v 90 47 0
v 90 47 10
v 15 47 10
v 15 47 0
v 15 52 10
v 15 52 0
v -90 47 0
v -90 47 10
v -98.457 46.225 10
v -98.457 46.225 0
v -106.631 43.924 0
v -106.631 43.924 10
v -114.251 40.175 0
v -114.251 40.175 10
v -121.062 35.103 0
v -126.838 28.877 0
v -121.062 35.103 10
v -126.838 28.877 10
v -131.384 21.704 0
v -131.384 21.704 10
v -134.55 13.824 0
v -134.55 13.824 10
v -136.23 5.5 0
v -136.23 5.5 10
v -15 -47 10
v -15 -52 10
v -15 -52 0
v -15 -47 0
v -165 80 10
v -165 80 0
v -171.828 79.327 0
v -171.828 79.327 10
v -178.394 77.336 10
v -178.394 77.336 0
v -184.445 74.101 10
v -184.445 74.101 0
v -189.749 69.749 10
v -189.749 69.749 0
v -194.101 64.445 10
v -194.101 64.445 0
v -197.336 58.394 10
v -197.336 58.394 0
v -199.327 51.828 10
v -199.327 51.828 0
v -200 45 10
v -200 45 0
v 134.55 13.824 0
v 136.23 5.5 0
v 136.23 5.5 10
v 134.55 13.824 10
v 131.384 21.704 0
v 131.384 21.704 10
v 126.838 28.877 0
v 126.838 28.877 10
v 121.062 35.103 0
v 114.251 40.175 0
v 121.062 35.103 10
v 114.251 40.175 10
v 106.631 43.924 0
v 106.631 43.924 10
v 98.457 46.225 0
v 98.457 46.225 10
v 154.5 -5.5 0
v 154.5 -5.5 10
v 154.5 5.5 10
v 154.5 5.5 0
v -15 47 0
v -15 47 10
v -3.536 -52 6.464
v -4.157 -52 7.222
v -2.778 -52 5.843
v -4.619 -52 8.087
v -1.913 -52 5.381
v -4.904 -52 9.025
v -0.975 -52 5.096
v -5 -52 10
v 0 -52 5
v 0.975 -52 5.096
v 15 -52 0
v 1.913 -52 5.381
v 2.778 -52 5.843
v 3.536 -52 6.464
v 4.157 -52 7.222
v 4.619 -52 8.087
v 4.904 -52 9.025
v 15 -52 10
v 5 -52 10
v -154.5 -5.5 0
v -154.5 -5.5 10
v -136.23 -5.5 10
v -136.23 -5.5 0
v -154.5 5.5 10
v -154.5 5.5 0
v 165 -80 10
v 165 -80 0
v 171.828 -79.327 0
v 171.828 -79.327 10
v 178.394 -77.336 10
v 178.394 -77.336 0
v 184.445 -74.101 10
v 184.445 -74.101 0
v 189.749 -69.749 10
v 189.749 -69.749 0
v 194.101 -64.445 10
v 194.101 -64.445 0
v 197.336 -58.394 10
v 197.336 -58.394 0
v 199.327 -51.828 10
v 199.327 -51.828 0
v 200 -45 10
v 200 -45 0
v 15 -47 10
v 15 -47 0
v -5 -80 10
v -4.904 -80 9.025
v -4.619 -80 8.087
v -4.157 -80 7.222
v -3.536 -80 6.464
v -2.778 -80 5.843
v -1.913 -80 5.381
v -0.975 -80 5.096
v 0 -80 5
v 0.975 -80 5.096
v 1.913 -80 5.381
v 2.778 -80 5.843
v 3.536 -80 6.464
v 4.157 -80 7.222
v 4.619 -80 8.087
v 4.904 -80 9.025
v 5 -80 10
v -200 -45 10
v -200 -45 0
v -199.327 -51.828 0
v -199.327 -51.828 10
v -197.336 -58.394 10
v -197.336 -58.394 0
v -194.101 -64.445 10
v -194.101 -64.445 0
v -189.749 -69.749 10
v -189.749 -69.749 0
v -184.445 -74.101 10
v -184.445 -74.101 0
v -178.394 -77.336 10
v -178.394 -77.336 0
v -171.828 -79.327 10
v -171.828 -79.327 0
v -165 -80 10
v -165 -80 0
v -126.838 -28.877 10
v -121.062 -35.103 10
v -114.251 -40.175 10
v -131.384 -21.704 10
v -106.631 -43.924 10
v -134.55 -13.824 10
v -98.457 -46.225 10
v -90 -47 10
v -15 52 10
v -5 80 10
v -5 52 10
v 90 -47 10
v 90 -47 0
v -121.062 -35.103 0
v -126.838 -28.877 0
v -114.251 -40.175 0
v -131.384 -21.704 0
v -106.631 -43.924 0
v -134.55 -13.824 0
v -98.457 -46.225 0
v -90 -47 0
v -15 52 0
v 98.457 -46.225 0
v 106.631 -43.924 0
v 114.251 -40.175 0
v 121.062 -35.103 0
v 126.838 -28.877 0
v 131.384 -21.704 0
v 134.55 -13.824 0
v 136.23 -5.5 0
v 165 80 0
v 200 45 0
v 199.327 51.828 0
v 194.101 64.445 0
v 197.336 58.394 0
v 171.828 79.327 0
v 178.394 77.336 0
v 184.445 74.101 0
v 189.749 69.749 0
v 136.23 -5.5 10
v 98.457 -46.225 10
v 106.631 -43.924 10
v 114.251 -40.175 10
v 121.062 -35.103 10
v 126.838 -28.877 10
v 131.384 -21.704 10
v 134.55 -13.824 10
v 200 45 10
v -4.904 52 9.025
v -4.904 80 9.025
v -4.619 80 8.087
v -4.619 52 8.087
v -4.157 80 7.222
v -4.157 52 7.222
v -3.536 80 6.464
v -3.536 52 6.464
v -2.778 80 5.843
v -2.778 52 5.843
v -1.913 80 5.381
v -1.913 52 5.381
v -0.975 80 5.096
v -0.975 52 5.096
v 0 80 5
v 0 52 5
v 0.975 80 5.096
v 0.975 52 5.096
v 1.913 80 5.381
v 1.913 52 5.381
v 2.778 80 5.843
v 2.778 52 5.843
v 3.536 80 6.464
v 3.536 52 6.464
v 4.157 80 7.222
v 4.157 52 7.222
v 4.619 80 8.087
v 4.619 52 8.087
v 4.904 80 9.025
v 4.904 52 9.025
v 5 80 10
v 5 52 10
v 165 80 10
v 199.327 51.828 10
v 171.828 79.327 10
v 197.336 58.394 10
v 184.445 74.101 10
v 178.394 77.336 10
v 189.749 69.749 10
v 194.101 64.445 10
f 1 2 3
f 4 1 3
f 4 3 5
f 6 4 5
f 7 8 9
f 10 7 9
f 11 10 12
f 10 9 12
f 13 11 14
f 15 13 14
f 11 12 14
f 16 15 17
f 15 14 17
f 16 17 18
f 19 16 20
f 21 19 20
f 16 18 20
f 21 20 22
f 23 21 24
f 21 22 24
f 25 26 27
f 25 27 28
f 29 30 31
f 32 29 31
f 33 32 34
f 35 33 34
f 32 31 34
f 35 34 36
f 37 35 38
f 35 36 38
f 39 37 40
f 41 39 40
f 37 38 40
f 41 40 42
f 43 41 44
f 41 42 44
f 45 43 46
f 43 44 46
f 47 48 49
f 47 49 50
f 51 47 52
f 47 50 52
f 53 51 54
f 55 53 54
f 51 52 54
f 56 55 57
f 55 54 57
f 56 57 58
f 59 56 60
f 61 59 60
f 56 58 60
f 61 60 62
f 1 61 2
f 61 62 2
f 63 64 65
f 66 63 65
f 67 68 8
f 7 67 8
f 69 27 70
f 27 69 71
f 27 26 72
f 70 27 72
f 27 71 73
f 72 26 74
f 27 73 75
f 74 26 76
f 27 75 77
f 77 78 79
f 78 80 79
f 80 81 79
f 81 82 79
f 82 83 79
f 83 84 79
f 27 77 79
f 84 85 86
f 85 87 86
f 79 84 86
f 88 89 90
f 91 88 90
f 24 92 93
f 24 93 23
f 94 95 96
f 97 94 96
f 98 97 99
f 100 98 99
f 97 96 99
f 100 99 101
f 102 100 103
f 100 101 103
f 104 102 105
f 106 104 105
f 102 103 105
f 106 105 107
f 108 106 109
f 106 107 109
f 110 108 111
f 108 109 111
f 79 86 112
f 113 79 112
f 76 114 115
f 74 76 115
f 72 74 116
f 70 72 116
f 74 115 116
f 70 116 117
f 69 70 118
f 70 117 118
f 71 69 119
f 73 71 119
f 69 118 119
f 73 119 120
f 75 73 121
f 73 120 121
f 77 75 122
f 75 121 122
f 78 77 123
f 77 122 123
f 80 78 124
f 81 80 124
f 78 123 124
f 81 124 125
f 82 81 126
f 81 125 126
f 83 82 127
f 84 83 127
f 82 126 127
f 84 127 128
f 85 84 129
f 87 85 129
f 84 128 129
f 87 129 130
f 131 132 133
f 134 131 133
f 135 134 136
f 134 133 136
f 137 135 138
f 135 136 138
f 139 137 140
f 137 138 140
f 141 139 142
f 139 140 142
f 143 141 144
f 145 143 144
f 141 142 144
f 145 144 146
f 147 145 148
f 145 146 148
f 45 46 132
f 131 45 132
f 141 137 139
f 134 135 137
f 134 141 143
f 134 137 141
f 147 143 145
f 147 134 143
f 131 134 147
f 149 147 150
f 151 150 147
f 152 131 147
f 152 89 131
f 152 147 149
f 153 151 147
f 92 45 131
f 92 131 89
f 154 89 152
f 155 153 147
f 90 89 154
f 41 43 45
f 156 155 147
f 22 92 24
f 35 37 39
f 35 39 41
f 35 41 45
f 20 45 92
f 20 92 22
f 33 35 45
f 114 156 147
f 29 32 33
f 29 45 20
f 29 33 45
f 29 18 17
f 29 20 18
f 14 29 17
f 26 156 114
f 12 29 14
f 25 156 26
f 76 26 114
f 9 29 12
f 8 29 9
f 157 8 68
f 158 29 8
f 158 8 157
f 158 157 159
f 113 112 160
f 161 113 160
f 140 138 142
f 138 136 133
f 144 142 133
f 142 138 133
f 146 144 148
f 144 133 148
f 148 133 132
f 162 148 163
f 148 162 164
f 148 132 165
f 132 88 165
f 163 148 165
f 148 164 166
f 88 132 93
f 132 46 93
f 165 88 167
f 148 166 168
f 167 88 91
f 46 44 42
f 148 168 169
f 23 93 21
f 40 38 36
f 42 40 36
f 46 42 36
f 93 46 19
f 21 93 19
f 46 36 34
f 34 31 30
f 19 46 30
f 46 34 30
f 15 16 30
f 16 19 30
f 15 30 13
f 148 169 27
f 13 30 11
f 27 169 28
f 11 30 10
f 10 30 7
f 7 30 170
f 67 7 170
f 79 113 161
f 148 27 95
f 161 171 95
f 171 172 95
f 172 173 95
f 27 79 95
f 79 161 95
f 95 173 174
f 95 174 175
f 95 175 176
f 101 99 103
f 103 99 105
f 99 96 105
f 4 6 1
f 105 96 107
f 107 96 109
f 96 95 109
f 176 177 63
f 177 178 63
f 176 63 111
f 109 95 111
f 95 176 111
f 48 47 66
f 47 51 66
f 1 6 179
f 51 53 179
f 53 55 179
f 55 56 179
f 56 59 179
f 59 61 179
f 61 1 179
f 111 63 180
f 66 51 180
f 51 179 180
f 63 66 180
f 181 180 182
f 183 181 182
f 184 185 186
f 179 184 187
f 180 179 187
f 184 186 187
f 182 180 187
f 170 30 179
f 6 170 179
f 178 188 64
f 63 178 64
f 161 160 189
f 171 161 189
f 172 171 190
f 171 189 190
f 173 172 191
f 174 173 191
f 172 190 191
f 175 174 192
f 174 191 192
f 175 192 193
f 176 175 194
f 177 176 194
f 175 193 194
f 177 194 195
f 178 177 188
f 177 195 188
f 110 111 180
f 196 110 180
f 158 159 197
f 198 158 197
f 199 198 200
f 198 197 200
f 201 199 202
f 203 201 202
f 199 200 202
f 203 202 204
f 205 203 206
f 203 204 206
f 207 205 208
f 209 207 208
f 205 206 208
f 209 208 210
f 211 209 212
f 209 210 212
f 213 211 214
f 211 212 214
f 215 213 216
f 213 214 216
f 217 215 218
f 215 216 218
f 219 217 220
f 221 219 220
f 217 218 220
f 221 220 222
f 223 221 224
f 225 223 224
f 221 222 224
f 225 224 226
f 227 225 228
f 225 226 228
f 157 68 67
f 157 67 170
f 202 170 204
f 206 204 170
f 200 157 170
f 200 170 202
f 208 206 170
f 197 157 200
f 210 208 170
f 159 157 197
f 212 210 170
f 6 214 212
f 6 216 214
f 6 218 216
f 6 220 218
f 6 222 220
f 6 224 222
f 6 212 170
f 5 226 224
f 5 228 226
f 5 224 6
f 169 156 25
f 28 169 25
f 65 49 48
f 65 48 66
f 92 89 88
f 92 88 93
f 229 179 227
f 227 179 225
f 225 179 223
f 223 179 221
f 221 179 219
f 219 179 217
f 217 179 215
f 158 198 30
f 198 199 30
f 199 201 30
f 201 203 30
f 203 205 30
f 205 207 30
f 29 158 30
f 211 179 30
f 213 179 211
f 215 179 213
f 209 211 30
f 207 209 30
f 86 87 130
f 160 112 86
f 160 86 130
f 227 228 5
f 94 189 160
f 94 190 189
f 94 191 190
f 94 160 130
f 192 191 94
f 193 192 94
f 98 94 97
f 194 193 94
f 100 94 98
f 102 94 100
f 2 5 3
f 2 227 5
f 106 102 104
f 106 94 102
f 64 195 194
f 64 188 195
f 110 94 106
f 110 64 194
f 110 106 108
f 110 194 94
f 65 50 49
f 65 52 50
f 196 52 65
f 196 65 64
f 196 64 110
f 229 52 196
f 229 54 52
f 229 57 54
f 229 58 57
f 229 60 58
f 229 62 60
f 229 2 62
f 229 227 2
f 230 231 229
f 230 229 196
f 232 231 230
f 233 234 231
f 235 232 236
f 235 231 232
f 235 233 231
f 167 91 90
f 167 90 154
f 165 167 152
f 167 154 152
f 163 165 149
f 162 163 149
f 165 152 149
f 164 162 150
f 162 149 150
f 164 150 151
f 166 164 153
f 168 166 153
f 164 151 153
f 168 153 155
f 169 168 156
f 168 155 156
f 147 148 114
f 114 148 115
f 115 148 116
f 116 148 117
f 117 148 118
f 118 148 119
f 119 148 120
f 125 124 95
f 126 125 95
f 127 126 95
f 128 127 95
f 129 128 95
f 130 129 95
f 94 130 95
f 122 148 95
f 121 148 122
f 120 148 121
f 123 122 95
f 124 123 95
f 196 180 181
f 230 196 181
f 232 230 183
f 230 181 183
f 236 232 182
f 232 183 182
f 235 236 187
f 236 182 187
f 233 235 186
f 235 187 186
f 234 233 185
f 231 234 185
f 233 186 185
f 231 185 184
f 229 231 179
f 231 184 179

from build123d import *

# Parameters (mm, degrees)
BOSS_EXTRU_2_DEPTH      = 10
ENL_V_MAT_EXTRU_1_DEPTH = 10
ESQUISSE4_W             = 309
ESQUISSE4_H             = 11
ENL_V_MAT_EXTRU_2_DEPTH = 10
ESQUISSE5_W             = 30
ESQUISSE5_H             = 104
ENL_V_MAT_EXTRU_3_DEPTH = 10
ESQUISSE6_R             = 5
ENL_V_MAT_EXTRU_4_DEPTH = 161


with BuildPart() as part:
    # Esquisse2 → Boss.-Extru.2 (new body)
    with BuildSketch(Plane.XY):
        with BuildLine():
            Line((165, 80), (-165, 80))
            ThreePointArc((-165, 80), (-189.748737342, 69.748737342), (-200, 45))
            Line((-200, 45), (-200, -45))
            ThreePointArc((-200, -45), (-189.748737342, -69.748737342), (-165, -80))
            Line((-165, -80), (165, -80))
            ThreePointArc((165, -80), (189.748737342, -69.748737342), (200, -45))
            Line((200, -45), (200, 45))
            ThreePointArc((200, 45), (189.748737342, 69.748737342), (165, 80))
        make_face()
    extrude(amount=BOSS_EXTRU_2_DEPTH)

    # Esquisse3 → Enlèv. mat.-Extru.1 (cut)
    with BuildSketch(Plane.XY.offset(10)):
        with BuildLine():
            Line((90, 47), (-90, 47))
            ThreePointArc((-90, 47), (-122.880465325, 33.380465325), (-136.5, 0.5))
            Line((-136.5, 0.5), (-136.5, -0.5))
            ThreePointArc((-136.5, -0.5), (-122.880465325, -33.380465325), (-90, -47))
            Line((-90, -47), (90, -47))
            ThreePointArc((90, -47), (122.880465325, -33.380465325), (136.5, -0.5))
            Line((136.5, -0.5), (136.5, 0.5))
            ThreePointArc((136.5, 0.5), (122.880465325, 33.380465325), (90, 47))
        make_face()
    extrude(amount=-ENL_V_MAT_EXTRU_1_DEPTH, mode=Mode.SUBTRACT)

    # Esquisse4 → Enlèv. mat.-Extru.2 (cut)
    with BuildSketch(Plane.XY.offset(10)):
        Rectangle(ESQUISSE4_W, ESQUISSE4_H)
    extrude(amount=-ENL_V_MAT_EXTRU_2_DEPTH, mode=Mode.SUBTRACT)

    # Esquisse5 → Enlèv. mat.-Extru.3 (cut)
    with BuildSketch(Plane.XY.offset(10)):
        Rectangle(ESQUISSE5_W, ESQUISSE5_H)
    extrude(amount=-ENL_V_MAT_EXTRU_3_DEPTH, mode=Mode.SUBTRACT)

    # Esquisse6 → Enlèv. mat.-Extru.4 (cut, through all)
    with BuildSketch(Plane.XZ.offset(80)):
        with Locations((0, 10)):
            Circle(ESQUISSE6_R)
    extrude(amount=-ENL_V_MAT_EXTRU_4_DEPTH, mode=Mode.SUBTRACT)


solid = part.part
